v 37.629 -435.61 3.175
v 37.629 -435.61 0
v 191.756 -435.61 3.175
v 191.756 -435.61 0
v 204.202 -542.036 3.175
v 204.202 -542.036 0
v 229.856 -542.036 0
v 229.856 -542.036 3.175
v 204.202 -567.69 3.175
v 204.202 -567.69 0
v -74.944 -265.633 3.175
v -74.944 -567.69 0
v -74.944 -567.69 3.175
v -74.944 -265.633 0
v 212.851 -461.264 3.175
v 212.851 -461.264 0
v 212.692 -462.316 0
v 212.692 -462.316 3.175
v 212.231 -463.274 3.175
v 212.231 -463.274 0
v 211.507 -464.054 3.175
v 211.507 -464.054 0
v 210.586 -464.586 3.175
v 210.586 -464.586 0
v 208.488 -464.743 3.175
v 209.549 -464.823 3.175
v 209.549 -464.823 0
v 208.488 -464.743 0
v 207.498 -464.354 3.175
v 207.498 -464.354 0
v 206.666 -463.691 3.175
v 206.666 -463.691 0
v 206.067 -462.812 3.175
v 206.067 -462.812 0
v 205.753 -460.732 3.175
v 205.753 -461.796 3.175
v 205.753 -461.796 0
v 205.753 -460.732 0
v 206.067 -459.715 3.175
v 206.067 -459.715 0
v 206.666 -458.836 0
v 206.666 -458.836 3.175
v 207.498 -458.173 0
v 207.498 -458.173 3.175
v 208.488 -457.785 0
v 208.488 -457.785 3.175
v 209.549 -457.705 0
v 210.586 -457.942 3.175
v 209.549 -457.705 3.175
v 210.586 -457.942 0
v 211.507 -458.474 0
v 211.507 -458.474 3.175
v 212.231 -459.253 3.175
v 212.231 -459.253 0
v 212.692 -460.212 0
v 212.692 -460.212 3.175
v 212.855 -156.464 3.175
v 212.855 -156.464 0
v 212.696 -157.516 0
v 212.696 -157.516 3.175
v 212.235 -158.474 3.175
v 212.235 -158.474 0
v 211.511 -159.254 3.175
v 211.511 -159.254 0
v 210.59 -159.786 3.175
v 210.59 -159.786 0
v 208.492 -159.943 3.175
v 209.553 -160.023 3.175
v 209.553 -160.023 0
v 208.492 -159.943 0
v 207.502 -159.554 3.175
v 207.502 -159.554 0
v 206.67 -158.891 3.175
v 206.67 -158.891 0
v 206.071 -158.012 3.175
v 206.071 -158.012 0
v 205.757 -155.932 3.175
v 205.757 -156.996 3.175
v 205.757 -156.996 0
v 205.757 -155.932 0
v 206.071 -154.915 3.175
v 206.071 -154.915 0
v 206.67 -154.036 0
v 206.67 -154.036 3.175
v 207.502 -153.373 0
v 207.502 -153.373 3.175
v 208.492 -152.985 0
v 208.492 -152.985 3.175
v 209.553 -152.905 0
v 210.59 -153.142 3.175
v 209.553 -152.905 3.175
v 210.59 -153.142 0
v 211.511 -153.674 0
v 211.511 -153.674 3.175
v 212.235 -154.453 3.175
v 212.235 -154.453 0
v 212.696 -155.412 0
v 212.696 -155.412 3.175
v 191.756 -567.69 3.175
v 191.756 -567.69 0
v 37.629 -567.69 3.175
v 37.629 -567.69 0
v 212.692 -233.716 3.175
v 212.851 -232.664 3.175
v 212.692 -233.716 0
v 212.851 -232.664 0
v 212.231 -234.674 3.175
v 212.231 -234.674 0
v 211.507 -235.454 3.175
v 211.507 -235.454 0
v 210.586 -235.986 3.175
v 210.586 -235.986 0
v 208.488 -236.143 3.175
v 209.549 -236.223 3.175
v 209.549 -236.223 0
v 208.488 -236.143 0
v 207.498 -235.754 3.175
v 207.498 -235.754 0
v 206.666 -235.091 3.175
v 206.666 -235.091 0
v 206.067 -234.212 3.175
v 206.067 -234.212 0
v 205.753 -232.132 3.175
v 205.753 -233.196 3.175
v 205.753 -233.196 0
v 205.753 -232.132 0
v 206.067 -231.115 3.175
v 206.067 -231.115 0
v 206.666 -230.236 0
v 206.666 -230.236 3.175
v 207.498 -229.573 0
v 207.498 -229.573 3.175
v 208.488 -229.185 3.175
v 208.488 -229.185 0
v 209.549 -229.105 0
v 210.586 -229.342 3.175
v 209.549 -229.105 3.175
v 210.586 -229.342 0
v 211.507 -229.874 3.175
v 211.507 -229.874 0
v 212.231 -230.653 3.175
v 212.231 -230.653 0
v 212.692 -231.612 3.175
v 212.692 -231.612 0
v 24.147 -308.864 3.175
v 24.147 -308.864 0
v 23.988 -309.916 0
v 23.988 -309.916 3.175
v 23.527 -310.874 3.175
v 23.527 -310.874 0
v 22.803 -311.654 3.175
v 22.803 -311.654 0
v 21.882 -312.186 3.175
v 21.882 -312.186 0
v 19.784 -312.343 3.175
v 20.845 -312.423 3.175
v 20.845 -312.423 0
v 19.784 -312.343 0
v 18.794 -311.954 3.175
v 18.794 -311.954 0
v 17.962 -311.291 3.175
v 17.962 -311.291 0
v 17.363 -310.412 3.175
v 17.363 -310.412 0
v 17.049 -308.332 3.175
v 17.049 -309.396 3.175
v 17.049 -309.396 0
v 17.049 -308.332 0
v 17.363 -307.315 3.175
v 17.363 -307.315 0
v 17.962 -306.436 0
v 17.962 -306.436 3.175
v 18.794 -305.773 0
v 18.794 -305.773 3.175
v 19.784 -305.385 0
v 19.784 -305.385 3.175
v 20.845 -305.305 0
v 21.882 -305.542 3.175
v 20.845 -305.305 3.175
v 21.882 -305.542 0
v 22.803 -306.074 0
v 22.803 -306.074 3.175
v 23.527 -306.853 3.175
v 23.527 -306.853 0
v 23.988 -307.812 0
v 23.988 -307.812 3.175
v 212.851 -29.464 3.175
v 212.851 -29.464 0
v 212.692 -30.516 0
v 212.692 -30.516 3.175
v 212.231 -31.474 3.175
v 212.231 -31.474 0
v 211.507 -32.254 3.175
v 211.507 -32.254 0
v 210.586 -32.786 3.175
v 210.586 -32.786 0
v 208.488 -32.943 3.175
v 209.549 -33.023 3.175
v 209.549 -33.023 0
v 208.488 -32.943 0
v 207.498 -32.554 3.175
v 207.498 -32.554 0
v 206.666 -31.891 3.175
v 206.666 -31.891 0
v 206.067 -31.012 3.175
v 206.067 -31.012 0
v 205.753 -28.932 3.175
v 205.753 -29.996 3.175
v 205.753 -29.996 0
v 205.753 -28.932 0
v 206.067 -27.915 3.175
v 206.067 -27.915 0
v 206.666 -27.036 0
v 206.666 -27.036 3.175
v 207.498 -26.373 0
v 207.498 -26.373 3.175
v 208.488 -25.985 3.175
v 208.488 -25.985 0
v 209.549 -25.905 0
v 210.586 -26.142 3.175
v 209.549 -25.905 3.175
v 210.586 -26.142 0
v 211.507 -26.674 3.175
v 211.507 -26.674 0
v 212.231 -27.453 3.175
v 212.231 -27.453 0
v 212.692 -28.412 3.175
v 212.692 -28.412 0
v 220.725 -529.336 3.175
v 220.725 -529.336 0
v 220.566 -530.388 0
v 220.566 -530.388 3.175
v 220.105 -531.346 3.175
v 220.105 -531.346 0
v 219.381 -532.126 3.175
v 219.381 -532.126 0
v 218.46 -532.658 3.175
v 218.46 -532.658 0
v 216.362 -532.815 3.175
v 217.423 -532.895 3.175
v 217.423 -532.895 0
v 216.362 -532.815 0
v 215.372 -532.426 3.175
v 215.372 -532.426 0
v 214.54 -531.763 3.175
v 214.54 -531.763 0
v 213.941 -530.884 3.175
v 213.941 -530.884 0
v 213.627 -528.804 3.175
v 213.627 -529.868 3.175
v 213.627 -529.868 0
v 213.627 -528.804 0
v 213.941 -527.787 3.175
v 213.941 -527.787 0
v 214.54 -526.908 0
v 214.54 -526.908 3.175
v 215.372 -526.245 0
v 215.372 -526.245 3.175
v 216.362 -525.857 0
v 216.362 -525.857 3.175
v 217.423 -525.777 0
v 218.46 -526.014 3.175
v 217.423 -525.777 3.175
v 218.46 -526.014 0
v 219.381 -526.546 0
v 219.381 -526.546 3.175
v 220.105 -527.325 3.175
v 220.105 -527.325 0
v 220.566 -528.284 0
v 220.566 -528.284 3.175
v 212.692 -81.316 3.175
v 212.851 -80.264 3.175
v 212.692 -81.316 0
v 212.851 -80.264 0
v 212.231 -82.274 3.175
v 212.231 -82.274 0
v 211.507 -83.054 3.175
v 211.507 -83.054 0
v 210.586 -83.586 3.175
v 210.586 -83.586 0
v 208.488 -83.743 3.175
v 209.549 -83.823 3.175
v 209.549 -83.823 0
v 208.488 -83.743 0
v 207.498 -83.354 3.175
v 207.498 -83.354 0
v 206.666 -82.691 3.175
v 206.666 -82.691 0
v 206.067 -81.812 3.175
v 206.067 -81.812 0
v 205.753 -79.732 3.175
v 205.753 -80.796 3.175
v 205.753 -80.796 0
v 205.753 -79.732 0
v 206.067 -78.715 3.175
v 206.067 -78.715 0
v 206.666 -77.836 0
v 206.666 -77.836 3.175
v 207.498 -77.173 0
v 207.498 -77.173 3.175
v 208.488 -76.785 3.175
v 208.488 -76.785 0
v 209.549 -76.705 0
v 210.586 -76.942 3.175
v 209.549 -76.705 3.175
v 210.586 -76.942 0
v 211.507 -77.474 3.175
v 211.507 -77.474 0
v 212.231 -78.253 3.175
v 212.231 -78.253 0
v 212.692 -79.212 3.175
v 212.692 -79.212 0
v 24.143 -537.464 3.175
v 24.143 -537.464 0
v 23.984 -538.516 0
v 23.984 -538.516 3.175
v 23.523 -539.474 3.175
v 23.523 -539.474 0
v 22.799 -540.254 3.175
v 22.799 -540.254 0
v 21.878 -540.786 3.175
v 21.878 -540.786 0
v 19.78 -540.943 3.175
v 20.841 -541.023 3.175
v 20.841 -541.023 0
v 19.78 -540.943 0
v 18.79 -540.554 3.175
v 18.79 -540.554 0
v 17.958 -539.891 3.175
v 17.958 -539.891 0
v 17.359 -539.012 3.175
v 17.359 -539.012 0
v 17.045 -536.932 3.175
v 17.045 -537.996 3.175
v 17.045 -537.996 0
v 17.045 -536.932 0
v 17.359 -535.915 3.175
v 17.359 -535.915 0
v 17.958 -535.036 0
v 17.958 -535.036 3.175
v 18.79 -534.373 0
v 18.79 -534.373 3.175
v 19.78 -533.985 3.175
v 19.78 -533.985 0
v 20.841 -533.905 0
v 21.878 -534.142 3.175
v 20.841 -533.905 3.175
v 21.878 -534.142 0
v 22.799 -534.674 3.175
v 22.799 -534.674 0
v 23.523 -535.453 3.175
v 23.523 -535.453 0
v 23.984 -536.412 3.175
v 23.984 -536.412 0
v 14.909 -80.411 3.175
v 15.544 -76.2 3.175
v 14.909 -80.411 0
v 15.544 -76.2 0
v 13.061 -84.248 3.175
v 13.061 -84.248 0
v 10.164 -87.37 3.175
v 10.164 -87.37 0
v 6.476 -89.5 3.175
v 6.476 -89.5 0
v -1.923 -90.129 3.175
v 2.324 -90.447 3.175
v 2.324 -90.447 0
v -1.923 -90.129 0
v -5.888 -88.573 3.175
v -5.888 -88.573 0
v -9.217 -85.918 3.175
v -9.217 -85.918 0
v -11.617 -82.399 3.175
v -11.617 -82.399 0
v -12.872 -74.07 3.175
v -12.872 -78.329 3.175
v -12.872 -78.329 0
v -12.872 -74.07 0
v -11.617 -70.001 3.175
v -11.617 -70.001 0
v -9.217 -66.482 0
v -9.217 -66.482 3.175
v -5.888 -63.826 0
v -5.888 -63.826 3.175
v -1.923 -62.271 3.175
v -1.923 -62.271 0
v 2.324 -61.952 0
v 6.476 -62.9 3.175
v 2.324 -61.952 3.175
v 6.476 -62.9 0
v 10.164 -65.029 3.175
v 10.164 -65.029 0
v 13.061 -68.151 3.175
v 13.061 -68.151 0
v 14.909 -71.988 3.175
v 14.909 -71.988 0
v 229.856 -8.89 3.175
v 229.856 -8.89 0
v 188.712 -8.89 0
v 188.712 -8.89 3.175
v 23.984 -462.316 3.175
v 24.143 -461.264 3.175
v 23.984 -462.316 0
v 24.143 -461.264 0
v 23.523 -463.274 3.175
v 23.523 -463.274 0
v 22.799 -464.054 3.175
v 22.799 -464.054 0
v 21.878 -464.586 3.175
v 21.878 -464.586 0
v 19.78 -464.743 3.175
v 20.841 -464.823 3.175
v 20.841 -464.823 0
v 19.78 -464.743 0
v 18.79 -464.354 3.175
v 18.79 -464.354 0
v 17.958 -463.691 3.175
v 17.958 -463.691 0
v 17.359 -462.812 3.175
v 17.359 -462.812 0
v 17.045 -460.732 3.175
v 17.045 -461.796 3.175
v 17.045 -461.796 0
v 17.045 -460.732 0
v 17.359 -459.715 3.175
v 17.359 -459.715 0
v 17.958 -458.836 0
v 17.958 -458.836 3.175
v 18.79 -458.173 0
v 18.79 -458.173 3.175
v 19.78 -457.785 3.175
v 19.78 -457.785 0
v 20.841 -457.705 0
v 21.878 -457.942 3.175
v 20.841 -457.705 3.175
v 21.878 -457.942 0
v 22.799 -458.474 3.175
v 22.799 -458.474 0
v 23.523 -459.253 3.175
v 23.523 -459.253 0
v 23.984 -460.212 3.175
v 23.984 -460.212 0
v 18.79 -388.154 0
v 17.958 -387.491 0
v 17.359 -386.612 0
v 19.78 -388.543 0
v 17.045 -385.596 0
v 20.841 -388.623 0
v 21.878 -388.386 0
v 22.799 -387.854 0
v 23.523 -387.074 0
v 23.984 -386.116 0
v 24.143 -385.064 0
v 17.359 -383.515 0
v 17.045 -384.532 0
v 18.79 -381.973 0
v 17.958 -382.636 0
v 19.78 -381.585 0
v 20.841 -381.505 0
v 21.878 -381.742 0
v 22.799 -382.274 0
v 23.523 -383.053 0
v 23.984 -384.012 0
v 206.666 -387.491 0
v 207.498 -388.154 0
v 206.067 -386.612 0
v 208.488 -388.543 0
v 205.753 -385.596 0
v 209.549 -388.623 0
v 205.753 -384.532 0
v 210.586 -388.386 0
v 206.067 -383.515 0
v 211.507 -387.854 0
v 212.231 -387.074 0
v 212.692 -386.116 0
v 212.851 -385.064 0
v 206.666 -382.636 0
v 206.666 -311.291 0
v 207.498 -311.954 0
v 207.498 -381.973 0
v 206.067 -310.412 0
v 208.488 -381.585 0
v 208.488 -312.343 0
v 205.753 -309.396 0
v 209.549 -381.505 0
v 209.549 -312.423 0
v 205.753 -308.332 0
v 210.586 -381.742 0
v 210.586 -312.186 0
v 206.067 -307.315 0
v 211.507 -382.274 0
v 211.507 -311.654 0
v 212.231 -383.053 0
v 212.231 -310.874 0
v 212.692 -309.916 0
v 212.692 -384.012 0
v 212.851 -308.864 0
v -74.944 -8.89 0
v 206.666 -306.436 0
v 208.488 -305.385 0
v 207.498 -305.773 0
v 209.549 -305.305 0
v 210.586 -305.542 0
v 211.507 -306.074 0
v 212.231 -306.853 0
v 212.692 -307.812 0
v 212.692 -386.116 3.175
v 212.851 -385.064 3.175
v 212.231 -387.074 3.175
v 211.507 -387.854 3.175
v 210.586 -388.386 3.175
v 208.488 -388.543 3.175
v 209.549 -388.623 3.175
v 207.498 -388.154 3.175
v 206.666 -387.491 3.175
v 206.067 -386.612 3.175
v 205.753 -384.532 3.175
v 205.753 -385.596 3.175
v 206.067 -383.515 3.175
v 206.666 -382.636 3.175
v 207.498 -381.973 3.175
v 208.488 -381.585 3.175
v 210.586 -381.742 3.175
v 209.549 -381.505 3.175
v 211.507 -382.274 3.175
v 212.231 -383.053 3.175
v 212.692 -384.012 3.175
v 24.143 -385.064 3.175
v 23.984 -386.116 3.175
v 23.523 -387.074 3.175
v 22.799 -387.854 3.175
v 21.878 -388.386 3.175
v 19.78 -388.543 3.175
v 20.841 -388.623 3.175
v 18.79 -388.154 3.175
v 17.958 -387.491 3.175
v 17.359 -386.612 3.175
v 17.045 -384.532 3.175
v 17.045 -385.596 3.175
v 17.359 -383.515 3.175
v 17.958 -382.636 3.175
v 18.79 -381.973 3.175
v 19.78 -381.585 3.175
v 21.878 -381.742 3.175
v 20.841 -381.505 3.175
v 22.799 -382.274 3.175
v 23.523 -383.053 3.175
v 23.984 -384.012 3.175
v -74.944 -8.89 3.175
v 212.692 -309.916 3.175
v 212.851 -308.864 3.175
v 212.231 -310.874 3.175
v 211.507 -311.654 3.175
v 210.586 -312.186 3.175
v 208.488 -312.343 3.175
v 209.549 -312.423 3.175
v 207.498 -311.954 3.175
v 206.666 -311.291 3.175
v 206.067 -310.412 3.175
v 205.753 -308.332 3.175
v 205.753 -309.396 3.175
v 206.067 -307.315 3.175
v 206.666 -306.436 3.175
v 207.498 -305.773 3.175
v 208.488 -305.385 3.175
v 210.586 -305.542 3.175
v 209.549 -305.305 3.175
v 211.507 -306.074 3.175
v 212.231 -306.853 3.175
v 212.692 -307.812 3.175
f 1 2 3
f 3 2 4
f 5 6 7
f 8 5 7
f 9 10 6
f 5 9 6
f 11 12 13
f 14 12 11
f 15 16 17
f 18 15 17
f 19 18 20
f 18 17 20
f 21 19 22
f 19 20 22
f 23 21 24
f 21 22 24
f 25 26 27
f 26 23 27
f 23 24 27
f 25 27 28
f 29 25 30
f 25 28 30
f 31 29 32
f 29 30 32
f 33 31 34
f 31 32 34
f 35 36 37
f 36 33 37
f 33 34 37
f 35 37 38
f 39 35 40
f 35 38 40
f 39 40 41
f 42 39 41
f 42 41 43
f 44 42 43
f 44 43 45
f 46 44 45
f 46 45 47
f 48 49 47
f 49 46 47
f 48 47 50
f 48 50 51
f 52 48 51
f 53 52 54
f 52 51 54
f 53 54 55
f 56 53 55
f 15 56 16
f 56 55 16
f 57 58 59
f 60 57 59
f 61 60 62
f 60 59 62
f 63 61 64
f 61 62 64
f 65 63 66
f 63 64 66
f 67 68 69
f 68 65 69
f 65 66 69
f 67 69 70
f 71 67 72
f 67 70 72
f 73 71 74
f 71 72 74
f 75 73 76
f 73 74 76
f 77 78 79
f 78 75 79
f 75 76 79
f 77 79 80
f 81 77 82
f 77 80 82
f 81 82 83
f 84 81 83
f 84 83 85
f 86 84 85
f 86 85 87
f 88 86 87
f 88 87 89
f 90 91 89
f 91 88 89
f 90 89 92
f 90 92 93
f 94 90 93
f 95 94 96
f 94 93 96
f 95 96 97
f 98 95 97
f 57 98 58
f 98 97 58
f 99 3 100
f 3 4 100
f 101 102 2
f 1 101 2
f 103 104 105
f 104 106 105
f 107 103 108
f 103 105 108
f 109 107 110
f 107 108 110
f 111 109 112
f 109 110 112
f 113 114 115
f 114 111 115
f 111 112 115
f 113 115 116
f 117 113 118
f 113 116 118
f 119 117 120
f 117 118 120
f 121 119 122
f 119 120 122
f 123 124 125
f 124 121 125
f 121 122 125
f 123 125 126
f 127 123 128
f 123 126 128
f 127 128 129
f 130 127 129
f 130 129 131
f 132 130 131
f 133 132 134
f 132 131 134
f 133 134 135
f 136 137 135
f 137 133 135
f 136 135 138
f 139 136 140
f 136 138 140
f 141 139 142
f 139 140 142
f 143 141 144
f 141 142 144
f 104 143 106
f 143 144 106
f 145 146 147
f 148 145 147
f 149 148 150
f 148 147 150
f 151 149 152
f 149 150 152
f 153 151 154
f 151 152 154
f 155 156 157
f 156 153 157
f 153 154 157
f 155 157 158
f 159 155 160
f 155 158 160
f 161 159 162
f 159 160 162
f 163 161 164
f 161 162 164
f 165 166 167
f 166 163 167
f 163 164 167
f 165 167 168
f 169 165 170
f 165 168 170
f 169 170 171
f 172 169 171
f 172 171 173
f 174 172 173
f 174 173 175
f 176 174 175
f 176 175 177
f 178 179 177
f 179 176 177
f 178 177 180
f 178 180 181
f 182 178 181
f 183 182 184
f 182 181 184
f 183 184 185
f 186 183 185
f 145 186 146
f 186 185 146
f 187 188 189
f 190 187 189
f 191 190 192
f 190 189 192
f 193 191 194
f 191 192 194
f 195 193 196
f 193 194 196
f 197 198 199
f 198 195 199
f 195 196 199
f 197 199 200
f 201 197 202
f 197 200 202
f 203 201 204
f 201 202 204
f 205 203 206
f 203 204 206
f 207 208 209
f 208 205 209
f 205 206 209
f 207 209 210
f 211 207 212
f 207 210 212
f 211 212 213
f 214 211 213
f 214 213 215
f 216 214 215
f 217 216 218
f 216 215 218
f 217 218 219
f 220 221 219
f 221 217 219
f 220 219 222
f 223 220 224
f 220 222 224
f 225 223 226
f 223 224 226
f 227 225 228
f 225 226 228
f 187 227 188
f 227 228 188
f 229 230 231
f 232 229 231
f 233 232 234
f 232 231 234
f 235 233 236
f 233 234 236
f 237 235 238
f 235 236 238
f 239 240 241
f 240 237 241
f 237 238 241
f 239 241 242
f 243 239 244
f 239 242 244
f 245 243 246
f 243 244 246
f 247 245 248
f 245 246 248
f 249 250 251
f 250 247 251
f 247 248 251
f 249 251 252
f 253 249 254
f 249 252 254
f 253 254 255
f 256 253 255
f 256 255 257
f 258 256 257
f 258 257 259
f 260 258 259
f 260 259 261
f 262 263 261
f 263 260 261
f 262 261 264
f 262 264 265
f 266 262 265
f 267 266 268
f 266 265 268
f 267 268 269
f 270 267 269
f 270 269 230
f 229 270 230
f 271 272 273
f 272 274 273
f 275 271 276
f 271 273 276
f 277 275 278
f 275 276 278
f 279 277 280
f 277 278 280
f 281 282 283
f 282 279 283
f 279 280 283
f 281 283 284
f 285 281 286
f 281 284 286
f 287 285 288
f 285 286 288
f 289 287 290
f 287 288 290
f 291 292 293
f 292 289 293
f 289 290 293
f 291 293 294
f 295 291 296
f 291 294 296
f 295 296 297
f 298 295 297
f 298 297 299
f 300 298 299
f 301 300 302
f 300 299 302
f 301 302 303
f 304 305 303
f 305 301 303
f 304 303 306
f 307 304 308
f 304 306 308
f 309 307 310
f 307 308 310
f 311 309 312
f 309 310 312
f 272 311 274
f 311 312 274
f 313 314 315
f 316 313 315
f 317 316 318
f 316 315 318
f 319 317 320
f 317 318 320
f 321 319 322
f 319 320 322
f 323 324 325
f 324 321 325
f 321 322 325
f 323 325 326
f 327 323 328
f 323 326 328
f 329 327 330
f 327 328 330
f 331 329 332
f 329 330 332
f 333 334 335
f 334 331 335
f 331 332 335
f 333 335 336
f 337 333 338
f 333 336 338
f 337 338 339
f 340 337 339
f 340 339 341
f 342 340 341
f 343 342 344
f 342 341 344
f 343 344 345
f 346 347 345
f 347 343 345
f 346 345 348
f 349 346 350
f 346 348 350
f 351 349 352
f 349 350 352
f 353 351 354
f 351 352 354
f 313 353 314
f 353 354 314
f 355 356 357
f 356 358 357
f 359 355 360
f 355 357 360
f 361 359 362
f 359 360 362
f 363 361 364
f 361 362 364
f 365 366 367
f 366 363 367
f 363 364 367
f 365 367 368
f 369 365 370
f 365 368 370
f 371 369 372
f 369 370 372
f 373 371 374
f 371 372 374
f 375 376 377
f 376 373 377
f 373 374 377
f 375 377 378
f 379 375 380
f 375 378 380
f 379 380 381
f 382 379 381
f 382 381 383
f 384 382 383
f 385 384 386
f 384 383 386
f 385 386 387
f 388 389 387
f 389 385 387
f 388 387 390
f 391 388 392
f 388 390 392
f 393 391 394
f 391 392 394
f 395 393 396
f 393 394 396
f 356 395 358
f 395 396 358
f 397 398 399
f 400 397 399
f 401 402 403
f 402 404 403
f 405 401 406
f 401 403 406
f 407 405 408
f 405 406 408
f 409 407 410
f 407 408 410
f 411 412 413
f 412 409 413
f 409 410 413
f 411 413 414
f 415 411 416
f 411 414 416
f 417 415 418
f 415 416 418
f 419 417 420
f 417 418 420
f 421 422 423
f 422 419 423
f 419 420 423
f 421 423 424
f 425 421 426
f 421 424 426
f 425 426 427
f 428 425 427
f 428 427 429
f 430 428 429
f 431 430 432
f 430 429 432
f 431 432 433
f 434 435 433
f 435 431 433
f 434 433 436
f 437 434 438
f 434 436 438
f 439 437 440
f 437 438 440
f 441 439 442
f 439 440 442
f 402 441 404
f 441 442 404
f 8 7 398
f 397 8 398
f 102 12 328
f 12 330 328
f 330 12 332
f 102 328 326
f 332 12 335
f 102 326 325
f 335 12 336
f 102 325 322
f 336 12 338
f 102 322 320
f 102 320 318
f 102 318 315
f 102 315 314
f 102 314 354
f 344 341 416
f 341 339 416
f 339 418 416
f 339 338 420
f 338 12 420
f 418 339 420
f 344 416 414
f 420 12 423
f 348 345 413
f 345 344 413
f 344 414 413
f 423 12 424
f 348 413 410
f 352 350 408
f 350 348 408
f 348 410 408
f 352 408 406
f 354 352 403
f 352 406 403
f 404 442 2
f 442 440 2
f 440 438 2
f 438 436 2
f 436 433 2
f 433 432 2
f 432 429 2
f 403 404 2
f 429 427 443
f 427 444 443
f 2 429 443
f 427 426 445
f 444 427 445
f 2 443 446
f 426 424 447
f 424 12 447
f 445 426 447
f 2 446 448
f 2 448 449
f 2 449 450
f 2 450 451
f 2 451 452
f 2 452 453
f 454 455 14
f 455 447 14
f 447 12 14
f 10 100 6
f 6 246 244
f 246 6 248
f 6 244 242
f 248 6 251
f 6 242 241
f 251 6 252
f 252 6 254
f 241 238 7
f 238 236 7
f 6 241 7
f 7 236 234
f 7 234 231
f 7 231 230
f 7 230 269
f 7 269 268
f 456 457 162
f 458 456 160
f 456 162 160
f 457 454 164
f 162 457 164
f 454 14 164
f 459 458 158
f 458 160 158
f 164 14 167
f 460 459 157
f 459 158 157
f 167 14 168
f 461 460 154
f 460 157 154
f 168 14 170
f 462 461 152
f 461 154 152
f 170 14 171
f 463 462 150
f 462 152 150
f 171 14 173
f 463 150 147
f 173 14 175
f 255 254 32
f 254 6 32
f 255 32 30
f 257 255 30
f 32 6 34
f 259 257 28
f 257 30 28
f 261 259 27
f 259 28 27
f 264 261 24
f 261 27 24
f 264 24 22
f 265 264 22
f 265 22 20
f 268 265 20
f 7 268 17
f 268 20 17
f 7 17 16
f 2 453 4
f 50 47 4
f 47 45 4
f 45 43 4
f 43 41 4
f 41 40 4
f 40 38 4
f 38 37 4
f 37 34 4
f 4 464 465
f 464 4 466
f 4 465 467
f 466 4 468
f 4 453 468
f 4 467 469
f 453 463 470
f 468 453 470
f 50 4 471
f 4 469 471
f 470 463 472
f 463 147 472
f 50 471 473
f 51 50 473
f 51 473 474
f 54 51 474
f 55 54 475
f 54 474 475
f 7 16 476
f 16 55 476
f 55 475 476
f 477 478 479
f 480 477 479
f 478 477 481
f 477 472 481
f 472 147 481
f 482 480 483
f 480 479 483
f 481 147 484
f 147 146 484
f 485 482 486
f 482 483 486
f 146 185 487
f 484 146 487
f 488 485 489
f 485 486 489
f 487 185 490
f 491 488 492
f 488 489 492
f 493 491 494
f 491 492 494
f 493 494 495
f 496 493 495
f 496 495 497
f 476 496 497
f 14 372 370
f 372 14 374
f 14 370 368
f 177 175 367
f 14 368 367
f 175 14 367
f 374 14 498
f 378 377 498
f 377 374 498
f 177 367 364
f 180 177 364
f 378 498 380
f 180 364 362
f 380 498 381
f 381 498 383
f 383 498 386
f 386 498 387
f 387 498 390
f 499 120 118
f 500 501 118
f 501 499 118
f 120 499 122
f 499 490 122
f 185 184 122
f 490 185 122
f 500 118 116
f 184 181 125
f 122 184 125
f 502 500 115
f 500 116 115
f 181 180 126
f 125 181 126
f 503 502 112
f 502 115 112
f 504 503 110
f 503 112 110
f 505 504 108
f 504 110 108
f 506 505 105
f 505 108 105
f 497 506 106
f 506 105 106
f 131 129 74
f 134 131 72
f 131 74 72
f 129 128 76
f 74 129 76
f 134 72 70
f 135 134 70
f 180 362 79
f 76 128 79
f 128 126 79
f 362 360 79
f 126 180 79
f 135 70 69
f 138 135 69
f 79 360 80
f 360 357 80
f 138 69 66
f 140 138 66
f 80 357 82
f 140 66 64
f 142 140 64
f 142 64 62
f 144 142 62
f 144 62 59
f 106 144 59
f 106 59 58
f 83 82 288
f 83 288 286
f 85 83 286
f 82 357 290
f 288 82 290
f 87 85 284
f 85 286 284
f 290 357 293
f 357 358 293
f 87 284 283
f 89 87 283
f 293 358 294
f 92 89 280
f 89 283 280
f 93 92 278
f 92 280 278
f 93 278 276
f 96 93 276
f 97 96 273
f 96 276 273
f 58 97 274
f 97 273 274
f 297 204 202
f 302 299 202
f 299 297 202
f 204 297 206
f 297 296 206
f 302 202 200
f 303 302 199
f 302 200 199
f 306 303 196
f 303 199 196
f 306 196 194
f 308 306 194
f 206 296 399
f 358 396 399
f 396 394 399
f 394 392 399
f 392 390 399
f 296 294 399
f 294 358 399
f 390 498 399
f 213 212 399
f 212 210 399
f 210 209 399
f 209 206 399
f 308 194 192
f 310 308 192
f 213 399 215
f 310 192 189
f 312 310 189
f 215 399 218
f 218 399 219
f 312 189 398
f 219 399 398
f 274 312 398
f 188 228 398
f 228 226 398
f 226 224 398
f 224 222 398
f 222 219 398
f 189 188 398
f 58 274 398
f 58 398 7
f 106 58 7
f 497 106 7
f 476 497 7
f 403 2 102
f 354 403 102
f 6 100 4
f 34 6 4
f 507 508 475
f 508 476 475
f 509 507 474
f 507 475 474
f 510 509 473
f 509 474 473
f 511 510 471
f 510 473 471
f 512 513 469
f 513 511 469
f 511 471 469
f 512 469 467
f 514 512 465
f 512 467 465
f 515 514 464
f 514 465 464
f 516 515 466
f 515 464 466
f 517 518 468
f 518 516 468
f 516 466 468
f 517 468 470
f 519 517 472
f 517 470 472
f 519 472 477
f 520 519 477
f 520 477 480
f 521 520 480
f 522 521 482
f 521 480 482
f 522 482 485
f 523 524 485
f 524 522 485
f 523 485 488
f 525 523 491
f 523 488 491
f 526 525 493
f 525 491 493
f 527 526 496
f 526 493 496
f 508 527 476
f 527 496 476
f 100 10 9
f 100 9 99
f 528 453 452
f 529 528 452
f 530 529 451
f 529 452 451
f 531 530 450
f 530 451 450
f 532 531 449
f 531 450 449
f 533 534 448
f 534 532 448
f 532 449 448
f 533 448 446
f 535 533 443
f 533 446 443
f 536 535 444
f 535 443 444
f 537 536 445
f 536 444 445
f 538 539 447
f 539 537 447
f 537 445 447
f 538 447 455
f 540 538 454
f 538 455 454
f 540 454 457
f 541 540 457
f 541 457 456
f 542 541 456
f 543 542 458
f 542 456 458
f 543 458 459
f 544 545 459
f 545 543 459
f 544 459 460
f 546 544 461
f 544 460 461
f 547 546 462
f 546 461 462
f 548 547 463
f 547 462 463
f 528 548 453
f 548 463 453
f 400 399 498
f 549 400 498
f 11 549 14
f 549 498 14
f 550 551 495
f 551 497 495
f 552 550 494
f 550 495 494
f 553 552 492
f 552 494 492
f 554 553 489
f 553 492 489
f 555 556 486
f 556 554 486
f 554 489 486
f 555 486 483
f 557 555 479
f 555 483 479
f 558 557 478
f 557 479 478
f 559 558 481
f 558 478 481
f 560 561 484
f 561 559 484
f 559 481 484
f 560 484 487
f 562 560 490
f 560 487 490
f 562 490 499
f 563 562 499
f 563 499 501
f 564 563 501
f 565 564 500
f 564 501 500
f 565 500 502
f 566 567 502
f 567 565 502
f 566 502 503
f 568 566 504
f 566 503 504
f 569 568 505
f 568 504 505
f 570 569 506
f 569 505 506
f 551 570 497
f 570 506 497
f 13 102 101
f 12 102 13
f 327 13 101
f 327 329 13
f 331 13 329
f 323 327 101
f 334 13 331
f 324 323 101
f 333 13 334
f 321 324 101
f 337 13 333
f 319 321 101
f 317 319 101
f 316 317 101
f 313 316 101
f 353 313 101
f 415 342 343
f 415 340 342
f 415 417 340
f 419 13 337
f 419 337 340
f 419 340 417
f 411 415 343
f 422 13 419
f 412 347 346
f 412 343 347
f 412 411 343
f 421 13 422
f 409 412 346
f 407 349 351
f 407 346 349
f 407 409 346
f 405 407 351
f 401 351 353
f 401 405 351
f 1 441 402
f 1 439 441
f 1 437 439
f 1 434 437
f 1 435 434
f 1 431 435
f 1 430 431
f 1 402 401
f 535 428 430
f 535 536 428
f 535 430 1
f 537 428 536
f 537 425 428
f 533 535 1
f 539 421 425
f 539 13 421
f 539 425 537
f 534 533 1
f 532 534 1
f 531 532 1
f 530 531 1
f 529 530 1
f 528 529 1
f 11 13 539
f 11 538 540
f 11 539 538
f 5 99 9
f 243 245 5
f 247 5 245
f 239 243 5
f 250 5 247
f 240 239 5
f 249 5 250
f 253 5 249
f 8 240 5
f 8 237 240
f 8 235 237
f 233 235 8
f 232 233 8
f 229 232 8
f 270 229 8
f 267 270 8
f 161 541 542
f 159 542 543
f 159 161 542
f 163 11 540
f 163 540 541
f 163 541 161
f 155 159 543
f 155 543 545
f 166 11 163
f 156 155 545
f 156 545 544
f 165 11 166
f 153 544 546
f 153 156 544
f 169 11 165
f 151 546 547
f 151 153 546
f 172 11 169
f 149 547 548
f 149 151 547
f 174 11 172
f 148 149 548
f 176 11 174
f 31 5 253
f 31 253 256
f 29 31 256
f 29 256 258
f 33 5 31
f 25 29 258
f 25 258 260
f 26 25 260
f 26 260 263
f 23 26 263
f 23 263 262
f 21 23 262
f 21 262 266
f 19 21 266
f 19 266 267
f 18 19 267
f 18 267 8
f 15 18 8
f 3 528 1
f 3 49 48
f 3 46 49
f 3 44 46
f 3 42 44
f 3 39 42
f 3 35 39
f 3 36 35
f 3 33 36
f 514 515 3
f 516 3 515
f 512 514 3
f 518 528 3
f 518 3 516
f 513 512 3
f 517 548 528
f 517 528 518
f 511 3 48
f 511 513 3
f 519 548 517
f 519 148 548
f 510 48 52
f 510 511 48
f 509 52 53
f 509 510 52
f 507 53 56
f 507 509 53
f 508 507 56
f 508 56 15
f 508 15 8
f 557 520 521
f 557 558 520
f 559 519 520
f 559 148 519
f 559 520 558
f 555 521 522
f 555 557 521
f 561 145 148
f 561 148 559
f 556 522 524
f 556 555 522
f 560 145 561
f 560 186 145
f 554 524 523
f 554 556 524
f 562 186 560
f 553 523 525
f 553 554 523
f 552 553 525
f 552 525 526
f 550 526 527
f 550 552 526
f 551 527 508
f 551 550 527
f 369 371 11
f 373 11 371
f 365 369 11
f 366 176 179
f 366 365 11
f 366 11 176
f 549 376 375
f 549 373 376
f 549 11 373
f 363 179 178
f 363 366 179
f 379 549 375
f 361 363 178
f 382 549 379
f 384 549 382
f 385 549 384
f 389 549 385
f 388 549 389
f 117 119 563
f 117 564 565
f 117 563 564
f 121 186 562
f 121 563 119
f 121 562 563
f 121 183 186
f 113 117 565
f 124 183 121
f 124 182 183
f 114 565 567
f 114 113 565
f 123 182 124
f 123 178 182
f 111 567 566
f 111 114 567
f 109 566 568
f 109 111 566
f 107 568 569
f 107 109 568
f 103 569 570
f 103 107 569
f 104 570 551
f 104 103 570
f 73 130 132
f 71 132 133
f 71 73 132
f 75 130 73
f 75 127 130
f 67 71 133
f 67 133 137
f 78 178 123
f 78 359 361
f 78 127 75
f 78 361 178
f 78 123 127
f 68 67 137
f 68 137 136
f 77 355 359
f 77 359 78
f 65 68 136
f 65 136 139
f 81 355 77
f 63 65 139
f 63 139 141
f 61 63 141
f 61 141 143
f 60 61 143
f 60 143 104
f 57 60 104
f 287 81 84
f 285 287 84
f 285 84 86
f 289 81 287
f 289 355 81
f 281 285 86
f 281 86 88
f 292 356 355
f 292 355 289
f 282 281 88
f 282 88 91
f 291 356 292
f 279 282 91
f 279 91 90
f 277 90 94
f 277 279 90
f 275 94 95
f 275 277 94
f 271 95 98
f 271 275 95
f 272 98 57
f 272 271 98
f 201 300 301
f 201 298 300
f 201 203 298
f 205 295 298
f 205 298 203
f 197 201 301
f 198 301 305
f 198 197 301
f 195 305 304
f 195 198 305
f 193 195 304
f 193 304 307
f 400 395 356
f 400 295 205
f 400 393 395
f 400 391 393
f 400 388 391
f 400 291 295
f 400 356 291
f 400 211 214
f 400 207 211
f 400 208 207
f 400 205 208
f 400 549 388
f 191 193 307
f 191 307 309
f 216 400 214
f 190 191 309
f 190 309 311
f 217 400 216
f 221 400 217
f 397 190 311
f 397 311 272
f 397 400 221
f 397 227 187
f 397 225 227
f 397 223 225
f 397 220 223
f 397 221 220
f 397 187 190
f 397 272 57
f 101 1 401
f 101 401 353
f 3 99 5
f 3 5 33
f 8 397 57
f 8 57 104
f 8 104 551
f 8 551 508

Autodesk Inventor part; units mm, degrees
ref_plane "YZ Plane" through (0, 0, 0) normal (1, 0, 0) x (0, 1, 0)
ref_plane "XZ Plane" through (0, 0, 0) normal (0, 1, 0) x (-1, 0, 0)
ref_plane "XY Plane" through (0, 0, 0) normal (0, 0, 1) x (1, 0, 0)
sketch "Sketch1" plane through (0, 0, 0) normal (0, 0, 1) x (1, 0, 0)
  line L0 (229.6952, -414.7737) -> (228.902, -414.7737)
  line L1 (204.202, -567.6898) -> (204.202, -542.0358)
  line L2 (204.202, -542.0358) -> (229.856, -542.0358)
  line L3 (204.202, -567.6898) -> (-74.944, -567.6898)
  line L4 (-74.944, -567.6898) -> (-74.944, -265.633)
  line L5 (229.856, -542.0358) -> (229.856, -8.8898)
  line L6 (229.856, -8.8898) -> (188.7123, -8.8898)
  circle A0 centre (20.5783, -308.8638) radius 3.5687
  circle A1 centre (20.574, -385.0638) radius 3.5687
  circle A2 centre (20.574, -461.2638) radius 3.5687
  circle A3 centre (20.574, -537.4638) radius 3.5687
  circle A4 centre (217.156, -529.3358) radius 3.5687
  circle A5 centre (209.282, -461.2638) radius 3.5687
  circle A6 centre (209.282, -385.0638) radius 3.5687
  circle A7 centre (209.282, -308.8638) radius 3.5687
  circle A8 centre (209.282, -232.6638) radius 3.5687
  circle A9 centre (209.2863, -156.4638) radius 3.5687
  circle A10 centre (209.282, -80.2638) radius 3.5687
  circle A11 centre (209.282, -29.4638) radius 3.5687
  line L7 (229.856, -8.8898) -> (-74.944, -8.8898)
  line L8 (-74.944, -8.8898) -> (-74.944, -567.6898)
  line L9 (191.756, -567.6898) -> (37.6288, -567.6898)
  line L10 (37.6288, -567.6898) -> (37.6288, -435.6098)
  line L11 (37.6288, -435.6098) -> (191.756, -435.6098)
  line L12 (191.756, -435.6098) -> (191.756, -567.6898)
  circle A12 centre (1.256, -76.1998) radius 189.4332 construction
  circle A13 centre (1.256, -76.1998) radius 14.2875
  point P0 (0, 0)
  dimension "d0" = 25.654
  dimension "d3" = 558.8
  dimension "d5" = 76.2
  dimension "d6" = 20.5697
  dimension "d7" = 20.574
  dimension "d9" = 76.2
  dimension "d10" = 76.2
  dimension "d11" = 76.2
  dimension "d12" = 76.2
  dimension "d13" = 25.654
  dimension "d14" = 12.7
  dimension "d15" = 76.2
  dimension "d16" = 76.2
  dimension "d17" = 76.2
  dimension "d18" = 43.2308
  dimension "d23" = 7.1374
  dimension "d24" = 7.1374
  dimension "d25" = 7.1374
  dimension "d26" = 7.1374
  dimension "d27" = 7.1374
  dimension "d28" = 7.1374
  dimension "d29" = 7.1374
  dimension "d30" = 7.1374
  dimension "d31" = 7.1374
  dimension "d32" = 7.1374
  dimension "d33" = 7.1374
  dimension "d34" = 7.1374
  dimension "d35" = 304.8
  dimension "d36" = 12.7
  dimension "d37" = 106.426
  dimension "d38" = 188.7037
  dimension "d39" = 188.708
  dimension "d40" = 188.708
  dimension "d41" = 188.708
  dimension "d42" = 20.574
  dimension "d43" = 20.574
  dimension "d44" = 20.574
  dimension "d45" = 30.226
  dimension "d46" = 20.574
  dimension "d47" = 12.446
  dimension "d48" = 154.1272
  dimension "d49" = 132.08
  dimension "d50" = 378.8664
  dimension "d51" = 76.2
  dimension "d56" = 491.49
  dimension "d57" = 28.575
  dimension "d61" = 50.8
extrude "Extrusion1" add sketch "Sketch1" along normal blind 3.175 contours L3 L12 L11 L10 L4 L8 L7 L6 L5 L2 L1
sketch "Sketch2" plane through (0, 0, 3.175) normal (0, 0, 1) x (1, 0, 0)
  point P0 (0, 0)
properties part number "GearboxPlateRev3"
